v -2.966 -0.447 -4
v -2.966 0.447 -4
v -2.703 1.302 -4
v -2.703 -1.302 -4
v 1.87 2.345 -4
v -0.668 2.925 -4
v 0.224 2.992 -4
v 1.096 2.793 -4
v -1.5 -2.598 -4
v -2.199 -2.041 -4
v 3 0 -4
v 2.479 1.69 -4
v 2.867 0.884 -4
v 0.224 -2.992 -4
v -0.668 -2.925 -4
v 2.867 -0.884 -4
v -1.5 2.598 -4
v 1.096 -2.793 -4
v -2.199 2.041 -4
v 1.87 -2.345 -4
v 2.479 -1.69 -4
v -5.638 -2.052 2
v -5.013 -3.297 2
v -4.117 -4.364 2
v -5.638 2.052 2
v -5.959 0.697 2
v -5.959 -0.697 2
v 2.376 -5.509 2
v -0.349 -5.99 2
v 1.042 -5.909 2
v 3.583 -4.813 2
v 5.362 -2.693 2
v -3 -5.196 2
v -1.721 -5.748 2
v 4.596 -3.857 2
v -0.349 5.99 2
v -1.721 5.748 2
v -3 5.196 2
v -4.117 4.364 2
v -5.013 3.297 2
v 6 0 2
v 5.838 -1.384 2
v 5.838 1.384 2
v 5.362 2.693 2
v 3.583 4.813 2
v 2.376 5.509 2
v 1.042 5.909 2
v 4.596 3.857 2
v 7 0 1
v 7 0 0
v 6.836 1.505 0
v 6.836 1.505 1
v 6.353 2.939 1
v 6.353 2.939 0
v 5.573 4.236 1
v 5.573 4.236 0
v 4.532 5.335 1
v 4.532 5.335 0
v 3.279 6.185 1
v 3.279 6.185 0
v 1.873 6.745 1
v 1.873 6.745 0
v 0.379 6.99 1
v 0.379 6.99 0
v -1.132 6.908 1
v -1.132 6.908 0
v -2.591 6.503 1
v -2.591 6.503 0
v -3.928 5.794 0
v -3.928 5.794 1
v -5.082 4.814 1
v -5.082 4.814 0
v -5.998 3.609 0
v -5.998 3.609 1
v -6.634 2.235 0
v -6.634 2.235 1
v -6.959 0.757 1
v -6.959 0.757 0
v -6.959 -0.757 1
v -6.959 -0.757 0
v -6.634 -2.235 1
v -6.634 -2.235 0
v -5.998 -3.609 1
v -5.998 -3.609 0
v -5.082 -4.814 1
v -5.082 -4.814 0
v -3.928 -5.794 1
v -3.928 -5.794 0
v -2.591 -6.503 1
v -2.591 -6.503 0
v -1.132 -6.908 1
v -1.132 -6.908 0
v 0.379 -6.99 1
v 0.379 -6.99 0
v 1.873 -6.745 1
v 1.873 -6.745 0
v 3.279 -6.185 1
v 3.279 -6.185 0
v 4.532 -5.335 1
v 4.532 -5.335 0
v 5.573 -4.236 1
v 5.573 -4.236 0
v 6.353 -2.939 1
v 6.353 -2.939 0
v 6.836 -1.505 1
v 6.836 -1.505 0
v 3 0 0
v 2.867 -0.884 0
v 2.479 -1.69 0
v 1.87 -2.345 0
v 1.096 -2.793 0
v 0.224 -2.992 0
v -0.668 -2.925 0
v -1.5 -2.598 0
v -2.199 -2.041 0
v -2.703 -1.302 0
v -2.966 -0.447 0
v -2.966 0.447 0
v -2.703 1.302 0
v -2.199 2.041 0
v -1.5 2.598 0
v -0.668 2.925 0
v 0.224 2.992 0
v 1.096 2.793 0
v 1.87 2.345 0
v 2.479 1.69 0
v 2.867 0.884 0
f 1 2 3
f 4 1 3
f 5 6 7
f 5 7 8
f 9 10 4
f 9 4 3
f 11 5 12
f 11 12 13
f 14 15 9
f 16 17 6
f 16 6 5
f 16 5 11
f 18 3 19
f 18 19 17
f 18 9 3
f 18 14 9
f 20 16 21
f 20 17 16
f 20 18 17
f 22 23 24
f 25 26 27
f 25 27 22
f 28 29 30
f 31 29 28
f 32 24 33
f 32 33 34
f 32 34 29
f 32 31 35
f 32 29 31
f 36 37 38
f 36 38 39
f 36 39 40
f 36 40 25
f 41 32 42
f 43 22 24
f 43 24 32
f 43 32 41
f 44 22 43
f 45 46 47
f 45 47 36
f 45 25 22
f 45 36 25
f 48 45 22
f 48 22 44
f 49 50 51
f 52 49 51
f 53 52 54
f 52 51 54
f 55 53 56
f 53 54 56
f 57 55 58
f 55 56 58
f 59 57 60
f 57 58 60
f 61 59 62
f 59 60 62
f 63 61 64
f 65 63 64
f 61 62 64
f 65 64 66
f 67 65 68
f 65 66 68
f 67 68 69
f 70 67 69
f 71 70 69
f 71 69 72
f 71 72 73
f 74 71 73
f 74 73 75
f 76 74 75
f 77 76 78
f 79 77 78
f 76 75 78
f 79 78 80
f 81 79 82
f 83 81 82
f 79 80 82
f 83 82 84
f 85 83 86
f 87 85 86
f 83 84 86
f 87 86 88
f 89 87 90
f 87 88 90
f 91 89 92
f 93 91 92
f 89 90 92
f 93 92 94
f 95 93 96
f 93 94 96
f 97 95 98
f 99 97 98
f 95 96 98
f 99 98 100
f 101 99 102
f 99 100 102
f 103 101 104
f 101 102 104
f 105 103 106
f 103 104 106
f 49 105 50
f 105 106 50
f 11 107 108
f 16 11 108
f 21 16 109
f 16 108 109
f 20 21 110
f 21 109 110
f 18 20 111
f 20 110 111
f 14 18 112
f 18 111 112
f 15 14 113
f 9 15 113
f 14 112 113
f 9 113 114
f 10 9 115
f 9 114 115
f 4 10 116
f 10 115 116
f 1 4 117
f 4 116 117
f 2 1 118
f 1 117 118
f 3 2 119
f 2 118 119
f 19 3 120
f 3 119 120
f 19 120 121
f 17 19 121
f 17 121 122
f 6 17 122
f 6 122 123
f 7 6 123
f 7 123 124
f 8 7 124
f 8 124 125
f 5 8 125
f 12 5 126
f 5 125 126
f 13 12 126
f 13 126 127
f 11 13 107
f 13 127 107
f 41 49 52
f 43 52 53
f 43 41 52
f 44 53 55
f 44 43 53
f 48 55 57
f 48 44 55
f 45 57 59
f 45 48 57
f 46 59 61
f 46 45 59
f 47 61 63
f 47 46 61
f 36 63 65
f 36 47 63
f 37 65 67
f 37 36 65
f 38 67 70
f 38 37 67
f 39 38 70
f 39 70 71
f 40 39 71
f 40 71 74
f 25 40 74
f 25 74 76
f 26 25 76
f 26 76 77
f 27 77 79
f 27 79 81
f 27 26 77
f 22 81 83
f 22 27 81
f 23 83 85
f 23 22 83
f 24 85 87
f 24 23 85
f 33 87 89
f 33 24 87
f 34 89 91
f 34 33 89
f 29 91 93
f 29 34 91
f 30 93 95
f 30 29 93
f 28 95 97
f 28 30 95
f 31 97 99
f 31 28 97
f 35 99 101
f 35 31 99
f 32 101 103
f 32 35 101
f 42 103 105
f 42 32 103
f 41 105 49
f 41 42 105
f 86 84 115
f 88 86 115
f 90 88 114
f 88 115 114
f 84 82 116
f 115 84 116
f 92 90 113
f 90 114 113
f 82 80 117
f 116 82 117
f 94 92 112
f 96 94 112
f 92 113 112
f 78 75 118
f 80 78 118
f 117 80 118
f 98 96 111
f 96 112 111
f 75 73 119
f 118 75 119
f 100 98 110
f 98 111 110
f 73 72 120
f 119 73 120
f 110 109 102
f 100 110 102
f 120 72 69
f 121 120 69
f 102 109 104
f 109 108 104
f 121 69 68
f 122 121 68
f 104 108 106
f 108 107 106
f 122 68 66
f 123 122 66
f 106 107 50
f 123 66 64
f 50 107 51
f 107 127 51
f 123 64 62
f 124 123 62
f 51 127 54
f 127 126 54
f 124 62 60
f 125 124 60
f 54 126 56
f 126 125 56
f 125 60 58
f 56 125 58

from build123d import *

# Parameters (mm, degrees)
F0_R     = 7
F1_DEPTH = 2
F2_SIZE  = 1
F3_R     = 3
F4_DEPTH = 4


with BuildPart() as f1:
    # F0 (on Top) → F1 (new body)
    with BuildSketch(Plane.XY):
        Circle(F0_R)
    extrude(amount=F1_DEPTH)

    # F2
    f2_edges = [f1.edges().sort_by_distance(p)[0] for p in [
        (-7, 0, 2),
    ]]
    chamfer(f2_edges, length=F2_SIZE)

    # F3 (on face) → F4 (join)
    with BuildSketch(Plane(origin=(0, 0, 0), x_dir=(1, 0, 0), z_dir=(0, 0, -1))):
        Circle(F3_R)
    extrude(amount=F4_DEPTH)


solid = f1.part
